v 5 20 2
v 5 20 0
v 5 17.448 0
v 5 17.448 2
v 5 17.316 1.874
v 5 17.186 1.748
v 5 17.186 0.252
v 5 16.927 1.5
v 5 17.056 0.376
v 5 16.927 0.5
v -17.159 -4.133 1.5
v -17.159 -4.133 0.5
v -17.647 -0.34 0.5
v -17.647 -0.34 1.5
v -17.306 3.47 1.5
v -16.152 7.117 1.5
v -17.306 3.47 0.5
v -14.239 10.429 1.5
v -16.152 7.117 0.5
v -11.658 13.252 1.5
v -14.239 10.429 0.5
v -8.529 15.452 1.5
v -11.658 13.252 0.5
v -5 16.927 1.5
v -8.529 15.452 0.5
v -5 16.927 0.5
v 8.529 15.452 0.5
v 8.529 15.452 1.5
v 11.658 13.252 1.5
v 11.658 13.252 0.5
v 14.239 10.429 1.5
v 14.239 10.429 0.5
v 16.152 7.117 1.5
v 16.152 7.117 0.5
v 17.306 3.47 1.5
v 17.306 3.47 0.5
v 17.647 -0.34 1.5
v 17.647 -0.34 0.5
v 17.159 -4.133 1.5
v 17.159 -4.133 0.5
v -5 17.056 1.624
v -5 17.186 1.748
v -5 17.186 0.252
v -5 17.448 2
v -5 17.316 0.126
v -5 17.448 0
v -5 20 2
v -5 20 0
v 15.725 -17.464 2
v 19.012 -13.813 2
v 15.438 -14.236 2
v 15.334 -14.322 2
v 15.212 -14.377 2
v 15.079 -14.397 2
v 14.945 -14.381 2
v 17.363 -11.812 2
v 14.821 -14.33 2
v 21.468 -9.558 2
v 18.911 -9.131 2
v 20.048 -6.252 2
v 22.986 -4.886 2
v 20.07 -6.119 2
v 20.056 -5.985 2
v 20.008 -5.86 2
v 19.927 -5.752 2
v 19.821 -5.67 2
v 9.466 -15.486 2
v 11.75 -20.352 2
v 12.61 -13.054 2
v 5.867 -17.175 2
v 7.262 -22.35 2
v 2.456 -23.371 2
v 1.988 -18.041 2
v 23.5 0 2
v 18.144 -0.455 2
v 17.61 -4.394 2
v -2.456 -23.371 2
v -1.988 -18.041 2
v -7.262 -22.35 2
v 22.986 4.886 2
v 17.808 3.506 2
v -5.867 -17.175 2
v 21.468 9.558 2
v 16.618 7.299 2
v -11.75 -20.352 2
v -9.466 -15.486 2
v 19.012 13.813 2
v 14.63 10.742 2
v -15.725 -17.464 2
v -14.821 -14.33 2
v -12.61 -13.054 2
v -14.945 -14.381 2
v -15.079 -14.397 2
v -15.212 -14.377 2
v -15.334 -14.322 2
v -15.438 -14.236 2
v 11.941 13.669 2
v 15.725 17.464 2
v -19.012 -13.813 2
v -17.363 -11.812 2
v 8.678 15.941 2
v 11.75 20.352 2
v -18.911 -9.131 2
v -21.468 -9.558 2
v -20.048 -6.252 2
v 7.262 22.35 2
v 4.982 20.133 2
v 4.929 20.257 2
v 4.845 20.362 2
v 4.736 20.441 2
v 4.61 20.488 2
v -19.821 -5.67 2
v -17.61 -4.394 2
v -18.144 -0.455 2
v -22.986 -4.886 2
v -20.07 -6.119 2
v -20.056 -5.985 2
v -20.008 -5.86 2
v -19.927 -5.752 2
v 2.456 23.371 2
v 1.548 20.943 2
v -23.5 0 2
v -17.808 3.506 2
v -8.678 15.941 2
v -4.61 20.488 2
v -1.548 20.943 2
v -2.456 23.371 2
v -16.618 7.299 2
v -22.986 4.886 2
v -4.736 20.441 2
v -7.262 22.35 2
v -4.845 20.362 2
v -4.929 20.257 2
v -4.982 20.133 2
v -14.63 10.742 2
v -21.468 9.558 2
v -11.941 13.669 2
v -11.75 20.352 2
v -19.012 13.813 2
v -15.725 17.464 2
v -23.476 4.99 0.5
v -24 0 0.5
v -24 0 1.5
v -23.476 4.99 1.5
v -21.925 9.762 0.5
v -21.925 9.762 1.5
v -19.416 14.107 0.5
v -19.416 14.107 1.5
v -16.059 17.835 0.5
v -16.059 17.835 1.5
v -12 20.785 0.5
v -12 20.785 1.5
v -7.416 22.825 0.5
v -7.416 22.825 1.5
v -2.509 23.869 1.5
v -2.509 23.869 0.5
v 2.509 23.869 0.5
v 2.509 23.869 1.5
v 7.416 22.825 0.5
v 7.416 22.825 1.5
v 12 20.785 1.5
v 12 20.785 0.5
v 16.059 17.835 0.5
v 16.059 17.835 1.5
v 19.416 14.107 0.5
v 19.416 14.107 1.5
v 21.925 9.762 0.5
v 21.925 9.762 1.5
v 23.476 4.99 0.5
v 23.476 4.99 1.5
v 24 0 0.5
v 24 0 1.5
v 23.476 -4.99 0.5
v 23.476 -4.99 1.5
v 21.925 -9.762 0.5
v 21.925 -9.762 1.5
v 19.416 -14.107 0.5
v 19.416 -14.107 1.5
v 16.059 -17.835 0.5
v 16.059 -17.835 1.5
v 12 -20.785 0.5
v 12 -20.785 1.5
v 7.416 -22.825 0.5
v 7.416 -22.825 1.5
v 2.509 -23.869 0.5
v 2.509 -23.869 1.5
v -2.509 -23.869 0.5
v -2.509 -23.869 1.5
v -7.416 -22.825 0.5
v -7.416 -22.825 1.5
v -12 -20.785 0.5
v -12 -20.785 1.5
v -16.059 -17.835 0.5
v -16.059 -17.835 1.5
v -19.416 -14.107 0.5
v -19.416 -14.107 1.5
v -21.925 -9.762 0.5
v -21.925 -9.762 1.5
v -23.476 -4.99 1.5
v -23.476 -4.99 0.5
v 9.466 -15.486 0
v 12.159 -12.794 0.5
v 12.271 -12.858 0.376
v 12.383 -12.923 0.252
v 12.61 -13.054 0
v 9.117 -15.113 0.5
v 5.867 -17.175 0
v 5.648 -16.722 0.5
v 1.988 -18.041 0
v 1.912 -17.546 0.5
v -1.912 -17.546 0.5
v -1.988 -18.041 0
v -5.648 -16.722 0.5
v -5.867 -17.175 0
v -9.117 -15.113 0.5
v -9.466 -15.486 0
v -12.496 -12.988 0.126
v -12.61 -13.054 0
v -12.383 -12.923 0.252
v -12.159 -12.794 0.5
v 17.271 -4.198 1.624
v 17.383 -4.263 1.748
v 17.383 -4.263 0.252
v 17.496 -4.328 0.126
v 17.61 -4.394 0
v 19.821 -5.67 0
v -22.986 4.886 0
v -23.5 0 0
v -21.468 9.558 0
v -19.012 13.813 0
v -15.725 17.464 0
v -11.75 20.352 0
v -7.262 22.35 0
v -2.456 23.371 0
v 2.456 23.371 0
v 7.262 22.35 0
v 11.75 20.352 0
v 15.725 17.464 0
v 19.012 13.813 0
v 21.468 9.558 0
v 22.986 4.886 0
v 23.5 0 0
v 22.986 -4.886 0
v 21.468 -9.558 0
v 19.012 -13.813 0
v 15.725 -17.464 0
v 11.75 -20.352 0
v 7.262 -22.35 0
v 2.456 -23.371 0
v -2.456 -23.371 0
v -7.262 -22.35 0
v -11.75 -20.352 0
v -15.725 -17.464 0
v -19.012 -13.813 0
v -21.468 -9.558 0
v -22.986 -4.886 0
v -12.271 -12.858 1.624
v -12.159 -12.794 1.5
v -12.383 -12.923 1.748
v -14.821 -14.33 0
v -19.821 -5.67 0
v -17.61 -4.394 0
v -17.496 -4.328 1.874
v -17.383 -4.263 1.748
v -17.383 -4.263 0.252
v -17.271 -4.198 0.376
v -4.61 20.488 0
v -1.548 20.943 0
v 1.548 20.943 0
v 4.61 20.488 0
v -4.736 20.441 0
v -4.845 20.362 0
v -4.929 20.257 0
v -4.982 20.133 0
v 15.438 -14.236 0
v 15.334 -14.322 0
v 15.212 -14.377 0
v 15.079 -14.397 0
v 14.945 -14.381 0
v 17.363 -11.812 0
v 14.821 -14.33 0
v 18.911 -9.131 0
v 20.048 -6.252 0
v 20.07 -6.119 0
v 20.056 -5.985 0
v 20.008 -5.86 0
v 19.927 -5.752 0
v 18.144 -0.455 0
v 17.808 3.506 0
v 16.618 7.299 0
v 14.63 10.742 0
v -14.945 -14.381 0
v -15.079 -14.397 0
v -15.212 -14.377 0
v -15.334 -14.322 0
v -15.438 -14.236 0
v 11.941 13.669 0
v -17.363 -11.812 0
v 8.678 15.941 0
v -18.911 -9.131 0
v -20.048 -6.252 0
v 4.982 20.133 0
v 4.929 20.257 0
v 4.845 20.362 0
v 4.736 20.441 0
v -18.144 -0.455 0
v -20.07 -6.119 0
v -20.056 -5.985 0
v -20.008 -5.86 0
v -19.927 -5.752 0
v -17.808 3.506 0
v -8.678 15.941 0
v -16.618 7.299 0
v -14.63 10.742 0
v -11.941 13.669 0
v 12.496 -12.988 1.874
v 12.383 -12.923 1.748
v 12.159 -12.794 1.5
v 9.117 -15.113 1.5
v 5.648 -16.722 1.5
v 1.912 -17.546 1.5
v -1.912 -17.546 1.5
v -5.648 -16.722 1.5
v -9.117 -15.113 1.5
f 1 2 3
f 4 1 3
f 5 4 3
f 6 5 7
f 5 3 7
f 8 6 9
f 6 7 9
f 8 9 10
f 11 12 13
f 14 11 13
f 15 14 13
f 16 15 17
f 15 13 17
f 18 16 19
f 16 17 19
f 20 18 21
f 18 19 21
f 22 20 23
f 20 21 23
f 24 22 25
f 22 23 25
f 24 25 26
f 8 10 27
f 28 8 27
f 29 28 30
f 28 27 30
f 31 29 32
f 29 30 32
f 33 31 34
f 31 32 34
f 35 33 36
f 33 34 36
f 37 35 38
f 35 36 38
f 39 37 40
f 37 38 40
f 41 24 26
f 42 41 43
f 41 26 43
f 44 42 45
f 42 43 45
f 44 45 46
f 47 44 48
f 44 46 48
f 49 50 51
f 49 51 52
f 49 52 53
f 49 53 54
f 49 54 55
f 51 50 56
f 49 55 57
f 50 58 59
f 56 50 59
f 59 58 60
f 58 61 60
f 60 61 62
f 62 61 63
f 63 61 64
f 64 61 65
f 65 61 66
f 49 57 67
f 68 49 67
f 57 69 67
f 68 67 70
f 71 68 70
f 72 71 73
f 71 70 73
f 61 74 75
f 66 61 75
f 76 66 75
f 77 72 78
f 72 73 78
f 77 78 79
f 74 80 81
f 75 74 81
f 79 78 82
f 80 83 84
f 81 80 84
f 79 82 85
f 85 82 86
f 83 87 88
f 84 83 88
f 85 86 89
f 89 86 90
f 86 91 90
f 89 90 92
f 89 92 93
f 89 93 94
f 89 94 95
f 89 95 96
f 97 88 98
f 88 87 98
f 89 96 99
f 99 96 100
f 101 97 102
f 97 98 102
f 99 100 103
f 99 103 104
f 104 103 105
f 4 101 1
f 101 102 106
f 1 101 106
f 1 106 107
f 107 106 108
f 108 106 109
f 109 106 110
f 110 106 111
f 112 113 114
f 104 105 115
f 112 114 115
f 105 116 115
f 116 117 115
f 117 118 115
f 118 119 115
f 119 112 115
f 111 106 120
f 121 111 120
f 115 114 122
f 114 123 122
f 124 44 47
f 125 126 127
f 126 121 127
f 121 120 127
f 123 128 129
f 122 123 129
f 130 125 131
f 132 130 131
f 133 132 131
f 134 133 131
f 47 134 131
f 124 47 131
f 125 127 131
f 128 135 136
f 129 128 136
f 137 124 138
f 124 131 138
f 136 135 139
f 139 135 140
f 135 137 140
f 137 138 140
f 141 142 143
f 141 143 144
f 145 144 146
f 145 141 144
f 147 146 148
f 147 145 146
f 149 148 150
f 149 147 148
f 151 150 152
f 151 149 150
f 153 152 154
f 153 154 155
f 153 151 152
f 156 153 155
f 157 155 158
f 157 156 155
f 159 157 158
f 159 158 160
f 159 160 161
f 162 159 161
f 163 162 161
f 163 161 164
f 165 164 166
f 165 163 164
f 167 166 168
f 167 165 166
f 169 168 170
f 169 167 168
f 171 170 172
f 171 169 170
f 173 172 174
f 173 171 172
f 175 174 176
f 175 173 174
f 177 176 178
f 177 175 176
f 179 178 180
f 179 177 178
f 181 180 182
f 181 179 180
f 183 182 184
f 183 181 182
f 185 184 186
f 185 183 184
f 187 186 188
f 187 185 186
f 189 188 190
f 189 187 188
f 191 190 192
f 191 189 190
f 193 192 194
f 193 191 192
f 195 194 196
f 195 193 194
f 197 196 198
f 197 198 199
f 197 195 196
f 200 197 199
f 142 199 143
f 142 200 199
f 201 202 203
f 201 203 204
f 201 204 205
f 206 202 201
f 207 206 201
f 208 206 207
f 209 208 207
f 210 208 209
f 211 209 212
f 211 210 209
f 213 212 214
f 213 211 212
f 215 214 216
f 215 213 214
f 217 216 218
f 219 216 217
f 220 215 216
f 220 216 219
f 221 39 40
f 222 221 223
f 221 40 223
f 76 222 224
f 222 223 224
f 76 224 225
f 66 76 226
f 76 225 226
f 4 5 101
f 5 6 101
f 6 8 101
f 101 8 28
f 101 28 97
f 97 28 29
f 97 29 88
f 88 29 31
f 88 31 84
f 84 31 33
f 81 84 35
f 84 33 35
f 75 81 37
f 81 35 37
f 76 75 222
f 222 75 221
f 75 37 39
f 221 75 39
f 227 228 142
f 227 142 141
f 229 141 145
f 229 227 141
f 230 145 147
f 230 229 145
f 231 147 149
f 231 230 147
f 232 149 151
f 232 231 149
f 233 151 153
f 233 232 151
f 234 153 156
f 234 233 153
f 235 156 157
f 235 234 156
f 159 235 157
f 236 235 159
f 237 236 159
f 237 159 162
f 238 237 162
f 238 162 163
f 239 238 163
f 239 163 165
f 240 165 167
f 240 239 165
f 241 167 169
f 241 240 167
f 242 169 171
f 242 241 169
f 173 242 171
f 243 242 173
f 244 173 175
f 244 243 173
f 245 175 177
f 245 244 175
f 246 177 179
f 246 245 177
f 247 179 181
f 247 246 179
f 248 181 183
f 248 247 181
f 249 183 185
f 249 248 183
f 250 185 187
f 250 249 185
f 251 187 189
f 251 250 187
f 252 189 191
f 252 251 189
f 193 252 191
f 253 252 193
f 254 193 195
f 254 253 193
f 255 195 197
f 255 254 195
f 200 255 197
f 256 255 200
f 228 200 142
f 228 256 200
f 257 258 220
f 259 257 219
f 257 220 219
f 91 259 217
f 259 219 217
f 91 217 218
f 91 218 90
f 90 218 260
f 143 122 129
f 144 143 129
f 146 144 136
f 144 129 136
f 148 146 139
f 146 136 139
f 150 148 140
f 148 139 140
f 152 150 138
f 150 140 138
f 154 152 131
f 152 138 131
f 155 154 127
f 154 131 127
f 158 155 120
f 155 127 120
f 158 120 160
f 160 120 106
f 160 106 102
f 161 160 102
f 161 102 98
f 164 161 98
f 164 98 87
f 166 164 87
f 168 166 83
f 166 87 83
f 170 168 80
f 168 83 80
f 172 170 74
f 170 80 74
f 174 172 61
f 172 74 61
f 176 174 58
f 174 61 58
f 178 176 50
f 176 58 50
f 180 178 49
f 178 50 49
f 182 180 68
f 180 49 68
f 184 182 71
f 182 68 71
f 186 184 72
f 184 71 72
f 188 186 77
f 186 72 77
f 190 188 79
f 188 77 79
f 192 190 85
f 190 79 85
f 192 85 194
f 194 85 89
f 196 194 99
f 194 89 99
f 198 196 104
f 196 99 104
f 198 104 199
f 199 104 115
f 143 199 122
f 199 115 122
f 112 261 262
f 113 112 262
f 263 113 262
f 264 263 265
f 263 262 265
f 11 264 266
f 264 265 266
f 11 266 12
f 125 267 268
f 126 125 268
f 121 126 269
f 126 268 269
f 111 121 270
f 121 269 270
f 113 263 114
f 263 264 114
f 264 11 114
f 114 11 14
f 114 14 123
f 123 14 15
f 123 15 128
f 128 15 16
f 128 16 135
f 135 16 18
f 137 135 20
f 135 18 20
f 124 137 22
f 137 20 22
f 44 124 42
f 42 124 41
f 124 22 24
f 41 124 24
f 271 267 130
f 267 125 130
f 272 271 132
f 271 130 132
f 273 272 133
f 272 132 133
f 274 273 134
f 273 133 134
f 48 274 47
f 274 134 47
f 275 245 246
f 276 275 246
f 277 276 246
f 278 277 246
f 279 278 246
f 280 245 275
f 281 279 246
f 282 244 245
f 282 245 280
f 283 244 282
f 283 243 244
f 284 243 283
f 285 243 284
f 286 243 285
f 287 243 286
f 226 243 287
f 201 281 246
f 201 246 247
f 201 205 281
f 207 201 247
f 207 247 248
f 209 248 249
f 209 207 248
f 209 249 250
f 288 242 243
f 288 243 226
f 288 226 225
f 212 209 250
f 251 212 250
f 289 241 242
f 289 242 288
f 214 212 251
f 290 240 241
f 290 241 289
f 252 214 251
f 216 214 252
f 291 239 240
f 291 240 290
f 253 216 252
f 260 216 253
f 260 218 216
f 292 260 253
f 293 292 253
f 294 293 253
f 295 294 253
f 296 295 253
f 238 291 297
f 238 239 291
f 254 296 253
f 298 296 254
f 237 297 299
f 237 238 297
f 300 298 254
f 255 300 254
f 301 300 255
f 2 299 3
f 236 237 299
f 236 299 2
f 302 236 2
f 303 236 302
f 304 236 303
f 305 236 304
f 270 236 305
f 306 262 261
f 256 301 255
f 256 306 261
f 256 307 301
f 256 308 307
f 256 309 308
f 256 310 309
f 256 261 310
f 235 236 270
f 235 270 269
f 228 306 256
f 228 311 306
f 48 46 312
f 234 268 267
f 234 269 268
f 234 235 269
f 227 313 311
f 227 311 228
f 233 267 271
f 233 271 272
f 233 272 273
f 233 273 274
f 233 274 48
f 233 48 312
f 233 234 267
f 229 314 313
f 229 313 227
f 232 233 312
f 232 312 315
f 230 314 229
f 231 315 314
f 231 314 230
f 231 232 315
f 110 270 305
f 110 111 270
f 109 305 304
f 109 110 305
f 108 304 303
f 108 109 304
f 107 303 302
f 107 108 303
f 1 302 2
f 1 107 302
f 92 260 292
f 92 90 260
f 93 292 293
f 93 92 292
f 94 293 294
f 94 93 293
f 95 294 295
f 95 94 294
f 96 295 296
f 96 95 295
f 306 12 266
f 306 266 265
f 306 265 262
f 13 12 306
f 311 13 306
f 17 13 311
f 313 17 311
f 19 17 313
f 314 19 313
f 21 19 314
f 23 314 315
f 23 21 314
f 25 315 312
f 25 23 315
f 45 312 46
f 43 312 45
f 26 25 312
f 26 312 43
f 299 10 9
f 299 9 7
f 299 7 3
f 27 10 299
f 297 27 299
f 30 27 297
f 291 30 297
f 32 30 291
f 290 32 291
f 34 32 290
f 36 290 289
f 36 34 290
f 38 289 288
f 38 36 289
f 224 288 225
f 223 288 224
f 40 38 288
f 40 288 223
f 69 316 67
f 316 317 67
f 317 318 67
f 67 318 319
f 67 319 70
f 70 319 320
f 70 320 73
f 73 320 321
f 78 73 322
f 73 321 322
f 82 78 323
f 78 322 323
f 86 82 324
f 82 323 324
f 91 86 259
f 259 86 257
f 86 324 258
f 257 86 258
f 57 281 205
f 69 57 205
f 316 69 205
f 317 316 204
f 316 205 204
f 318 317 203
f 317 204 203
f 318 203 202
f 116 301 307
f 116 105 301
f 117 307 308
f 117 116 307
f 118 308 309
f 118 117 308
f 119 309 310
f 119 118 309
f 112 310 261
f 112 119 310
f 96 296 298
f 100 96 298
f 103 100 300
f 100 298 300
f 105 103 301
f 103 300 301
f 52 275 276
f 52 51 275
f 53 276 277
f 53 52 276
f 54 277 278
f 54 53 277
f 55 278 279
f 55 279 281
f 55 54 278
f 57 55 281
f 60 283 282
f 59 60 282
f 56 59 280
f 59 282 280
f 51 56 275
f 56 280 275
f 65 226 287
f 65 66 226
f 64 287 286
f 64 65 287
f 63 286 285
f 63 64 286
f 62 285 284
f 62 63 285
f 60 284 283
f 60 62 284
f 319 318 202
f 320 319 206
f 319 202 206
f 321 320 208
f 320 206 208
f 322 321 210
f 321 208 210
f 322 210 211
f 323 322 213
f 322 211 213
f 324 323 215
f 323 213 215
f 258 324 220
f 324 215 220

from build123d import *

# Parameters (mm, degrees)
SKETCH23_R               = 24
SKETCH23_R_2             = 17.5
BOSS_EXTRUDE3_DEPTH      = 2
MOVE_FACE1_BY            = 0.15
CHAMFER2_SIZE            = 0.5
CUT_EXTRUDE3_DEPTH       = 2
FILLET1_R                = 0.5
CIRPATTERN1_COUNT        = 3
FILLET1_OF_CIRPATTERN1_R = 0.5


with BuildPart() as part:
    # Sketch23 → Boss-Extrude3 (new body)
    with BuildSketch(Plane(origin=(0, 0, 0), x_dir=(-1, 0, 0), z_dir=(0, 0, -1))):
        Circle(SKETCH23_R)
        Circle(SKETCH23_R_2, mode=Mode.SUBTRACT)
    extrude(amount=-BOSS_EXTRUDE3_DEPTH)

    # Move Face1: a curved face moved inward by 0.15
    add(Solid.thicken(part.faces().sort_by_distance((17.5, 0, 1))[0], -MOVE_FACE1_BY), mode=Mode.SUBTRACT)

    # Chamfer2
    chamfer2_edges = [part.edges().sort_by_distance(p)[0] for p in [
        (24, 0, 0),
        (24, 0, 2),
        (17.65, 0, 2),
        (17.65, 0, 0),
    ]]
    chamfer(chamfer2_edges, length=CHAMFER2_SIZE)

    # Sketch24 → Cut-Extrude3 (cut)
    with BuildSketch(Plane(origin=(0, 0, 0), x_dir=(-1, 0, 0), z_dir=(0, 0, -1))):
        with BuildLine():
            Line((-5, 20.396078054), (-5, 16.926975512))
            ThreePointArc((-5, 16.926975512), (0, 17.65), (5, 16.926975512))
            Line((5, 16.926975512), (5, 20.396078054))
            ThreePointArc((5, 20.396078054), (0, 21), (-5, 20.396078054))
        make_face()
    cut_extrude3 = extrude(amount=-CUT_EXTRUDE3_DEPTH, mode=Mode.SUBTRACT)

    # Fillet1
    fillet1_edges = [part.edges().sort_by_distance(p)[0] for p in [
        (5, 20.396078054, 1),
        (-5, 20.396078054, 1),
    ]]
    fillet(fillet1_edges, radius=FILLET1_R)

    # CirPattern1: Cut-Extrude3 ×3 about axis
    cirpattern1_axis = Axis((0, 0, 0), (0, 0, 1))
    for i in range(1, CIRPATTERN1_COUNT):
        add(cut_extrude3.rotate(cirpattern1_axis, i * 360 / CIRPATTERN1_COUNT), mode=Mode.SUBTRACT)

    # Fillet1 of CirPattern1
    fillet1_of_cirpattern1_edges = [part.edges().sort_by_distance(p)[0] for p in [
        (-20.163521733, -5.867912008, 1),
        (-15.163521733, -14.528166046, 1),
        (15.163521733, -14.528166046, 1),
        (20.163521733, -5.867912008, 1),
    ]]
    fillet(fillet1_of_cirpattern1_edges, radius=FILLET1_OF_CIRPATTERN1_R)


solid = part.part
